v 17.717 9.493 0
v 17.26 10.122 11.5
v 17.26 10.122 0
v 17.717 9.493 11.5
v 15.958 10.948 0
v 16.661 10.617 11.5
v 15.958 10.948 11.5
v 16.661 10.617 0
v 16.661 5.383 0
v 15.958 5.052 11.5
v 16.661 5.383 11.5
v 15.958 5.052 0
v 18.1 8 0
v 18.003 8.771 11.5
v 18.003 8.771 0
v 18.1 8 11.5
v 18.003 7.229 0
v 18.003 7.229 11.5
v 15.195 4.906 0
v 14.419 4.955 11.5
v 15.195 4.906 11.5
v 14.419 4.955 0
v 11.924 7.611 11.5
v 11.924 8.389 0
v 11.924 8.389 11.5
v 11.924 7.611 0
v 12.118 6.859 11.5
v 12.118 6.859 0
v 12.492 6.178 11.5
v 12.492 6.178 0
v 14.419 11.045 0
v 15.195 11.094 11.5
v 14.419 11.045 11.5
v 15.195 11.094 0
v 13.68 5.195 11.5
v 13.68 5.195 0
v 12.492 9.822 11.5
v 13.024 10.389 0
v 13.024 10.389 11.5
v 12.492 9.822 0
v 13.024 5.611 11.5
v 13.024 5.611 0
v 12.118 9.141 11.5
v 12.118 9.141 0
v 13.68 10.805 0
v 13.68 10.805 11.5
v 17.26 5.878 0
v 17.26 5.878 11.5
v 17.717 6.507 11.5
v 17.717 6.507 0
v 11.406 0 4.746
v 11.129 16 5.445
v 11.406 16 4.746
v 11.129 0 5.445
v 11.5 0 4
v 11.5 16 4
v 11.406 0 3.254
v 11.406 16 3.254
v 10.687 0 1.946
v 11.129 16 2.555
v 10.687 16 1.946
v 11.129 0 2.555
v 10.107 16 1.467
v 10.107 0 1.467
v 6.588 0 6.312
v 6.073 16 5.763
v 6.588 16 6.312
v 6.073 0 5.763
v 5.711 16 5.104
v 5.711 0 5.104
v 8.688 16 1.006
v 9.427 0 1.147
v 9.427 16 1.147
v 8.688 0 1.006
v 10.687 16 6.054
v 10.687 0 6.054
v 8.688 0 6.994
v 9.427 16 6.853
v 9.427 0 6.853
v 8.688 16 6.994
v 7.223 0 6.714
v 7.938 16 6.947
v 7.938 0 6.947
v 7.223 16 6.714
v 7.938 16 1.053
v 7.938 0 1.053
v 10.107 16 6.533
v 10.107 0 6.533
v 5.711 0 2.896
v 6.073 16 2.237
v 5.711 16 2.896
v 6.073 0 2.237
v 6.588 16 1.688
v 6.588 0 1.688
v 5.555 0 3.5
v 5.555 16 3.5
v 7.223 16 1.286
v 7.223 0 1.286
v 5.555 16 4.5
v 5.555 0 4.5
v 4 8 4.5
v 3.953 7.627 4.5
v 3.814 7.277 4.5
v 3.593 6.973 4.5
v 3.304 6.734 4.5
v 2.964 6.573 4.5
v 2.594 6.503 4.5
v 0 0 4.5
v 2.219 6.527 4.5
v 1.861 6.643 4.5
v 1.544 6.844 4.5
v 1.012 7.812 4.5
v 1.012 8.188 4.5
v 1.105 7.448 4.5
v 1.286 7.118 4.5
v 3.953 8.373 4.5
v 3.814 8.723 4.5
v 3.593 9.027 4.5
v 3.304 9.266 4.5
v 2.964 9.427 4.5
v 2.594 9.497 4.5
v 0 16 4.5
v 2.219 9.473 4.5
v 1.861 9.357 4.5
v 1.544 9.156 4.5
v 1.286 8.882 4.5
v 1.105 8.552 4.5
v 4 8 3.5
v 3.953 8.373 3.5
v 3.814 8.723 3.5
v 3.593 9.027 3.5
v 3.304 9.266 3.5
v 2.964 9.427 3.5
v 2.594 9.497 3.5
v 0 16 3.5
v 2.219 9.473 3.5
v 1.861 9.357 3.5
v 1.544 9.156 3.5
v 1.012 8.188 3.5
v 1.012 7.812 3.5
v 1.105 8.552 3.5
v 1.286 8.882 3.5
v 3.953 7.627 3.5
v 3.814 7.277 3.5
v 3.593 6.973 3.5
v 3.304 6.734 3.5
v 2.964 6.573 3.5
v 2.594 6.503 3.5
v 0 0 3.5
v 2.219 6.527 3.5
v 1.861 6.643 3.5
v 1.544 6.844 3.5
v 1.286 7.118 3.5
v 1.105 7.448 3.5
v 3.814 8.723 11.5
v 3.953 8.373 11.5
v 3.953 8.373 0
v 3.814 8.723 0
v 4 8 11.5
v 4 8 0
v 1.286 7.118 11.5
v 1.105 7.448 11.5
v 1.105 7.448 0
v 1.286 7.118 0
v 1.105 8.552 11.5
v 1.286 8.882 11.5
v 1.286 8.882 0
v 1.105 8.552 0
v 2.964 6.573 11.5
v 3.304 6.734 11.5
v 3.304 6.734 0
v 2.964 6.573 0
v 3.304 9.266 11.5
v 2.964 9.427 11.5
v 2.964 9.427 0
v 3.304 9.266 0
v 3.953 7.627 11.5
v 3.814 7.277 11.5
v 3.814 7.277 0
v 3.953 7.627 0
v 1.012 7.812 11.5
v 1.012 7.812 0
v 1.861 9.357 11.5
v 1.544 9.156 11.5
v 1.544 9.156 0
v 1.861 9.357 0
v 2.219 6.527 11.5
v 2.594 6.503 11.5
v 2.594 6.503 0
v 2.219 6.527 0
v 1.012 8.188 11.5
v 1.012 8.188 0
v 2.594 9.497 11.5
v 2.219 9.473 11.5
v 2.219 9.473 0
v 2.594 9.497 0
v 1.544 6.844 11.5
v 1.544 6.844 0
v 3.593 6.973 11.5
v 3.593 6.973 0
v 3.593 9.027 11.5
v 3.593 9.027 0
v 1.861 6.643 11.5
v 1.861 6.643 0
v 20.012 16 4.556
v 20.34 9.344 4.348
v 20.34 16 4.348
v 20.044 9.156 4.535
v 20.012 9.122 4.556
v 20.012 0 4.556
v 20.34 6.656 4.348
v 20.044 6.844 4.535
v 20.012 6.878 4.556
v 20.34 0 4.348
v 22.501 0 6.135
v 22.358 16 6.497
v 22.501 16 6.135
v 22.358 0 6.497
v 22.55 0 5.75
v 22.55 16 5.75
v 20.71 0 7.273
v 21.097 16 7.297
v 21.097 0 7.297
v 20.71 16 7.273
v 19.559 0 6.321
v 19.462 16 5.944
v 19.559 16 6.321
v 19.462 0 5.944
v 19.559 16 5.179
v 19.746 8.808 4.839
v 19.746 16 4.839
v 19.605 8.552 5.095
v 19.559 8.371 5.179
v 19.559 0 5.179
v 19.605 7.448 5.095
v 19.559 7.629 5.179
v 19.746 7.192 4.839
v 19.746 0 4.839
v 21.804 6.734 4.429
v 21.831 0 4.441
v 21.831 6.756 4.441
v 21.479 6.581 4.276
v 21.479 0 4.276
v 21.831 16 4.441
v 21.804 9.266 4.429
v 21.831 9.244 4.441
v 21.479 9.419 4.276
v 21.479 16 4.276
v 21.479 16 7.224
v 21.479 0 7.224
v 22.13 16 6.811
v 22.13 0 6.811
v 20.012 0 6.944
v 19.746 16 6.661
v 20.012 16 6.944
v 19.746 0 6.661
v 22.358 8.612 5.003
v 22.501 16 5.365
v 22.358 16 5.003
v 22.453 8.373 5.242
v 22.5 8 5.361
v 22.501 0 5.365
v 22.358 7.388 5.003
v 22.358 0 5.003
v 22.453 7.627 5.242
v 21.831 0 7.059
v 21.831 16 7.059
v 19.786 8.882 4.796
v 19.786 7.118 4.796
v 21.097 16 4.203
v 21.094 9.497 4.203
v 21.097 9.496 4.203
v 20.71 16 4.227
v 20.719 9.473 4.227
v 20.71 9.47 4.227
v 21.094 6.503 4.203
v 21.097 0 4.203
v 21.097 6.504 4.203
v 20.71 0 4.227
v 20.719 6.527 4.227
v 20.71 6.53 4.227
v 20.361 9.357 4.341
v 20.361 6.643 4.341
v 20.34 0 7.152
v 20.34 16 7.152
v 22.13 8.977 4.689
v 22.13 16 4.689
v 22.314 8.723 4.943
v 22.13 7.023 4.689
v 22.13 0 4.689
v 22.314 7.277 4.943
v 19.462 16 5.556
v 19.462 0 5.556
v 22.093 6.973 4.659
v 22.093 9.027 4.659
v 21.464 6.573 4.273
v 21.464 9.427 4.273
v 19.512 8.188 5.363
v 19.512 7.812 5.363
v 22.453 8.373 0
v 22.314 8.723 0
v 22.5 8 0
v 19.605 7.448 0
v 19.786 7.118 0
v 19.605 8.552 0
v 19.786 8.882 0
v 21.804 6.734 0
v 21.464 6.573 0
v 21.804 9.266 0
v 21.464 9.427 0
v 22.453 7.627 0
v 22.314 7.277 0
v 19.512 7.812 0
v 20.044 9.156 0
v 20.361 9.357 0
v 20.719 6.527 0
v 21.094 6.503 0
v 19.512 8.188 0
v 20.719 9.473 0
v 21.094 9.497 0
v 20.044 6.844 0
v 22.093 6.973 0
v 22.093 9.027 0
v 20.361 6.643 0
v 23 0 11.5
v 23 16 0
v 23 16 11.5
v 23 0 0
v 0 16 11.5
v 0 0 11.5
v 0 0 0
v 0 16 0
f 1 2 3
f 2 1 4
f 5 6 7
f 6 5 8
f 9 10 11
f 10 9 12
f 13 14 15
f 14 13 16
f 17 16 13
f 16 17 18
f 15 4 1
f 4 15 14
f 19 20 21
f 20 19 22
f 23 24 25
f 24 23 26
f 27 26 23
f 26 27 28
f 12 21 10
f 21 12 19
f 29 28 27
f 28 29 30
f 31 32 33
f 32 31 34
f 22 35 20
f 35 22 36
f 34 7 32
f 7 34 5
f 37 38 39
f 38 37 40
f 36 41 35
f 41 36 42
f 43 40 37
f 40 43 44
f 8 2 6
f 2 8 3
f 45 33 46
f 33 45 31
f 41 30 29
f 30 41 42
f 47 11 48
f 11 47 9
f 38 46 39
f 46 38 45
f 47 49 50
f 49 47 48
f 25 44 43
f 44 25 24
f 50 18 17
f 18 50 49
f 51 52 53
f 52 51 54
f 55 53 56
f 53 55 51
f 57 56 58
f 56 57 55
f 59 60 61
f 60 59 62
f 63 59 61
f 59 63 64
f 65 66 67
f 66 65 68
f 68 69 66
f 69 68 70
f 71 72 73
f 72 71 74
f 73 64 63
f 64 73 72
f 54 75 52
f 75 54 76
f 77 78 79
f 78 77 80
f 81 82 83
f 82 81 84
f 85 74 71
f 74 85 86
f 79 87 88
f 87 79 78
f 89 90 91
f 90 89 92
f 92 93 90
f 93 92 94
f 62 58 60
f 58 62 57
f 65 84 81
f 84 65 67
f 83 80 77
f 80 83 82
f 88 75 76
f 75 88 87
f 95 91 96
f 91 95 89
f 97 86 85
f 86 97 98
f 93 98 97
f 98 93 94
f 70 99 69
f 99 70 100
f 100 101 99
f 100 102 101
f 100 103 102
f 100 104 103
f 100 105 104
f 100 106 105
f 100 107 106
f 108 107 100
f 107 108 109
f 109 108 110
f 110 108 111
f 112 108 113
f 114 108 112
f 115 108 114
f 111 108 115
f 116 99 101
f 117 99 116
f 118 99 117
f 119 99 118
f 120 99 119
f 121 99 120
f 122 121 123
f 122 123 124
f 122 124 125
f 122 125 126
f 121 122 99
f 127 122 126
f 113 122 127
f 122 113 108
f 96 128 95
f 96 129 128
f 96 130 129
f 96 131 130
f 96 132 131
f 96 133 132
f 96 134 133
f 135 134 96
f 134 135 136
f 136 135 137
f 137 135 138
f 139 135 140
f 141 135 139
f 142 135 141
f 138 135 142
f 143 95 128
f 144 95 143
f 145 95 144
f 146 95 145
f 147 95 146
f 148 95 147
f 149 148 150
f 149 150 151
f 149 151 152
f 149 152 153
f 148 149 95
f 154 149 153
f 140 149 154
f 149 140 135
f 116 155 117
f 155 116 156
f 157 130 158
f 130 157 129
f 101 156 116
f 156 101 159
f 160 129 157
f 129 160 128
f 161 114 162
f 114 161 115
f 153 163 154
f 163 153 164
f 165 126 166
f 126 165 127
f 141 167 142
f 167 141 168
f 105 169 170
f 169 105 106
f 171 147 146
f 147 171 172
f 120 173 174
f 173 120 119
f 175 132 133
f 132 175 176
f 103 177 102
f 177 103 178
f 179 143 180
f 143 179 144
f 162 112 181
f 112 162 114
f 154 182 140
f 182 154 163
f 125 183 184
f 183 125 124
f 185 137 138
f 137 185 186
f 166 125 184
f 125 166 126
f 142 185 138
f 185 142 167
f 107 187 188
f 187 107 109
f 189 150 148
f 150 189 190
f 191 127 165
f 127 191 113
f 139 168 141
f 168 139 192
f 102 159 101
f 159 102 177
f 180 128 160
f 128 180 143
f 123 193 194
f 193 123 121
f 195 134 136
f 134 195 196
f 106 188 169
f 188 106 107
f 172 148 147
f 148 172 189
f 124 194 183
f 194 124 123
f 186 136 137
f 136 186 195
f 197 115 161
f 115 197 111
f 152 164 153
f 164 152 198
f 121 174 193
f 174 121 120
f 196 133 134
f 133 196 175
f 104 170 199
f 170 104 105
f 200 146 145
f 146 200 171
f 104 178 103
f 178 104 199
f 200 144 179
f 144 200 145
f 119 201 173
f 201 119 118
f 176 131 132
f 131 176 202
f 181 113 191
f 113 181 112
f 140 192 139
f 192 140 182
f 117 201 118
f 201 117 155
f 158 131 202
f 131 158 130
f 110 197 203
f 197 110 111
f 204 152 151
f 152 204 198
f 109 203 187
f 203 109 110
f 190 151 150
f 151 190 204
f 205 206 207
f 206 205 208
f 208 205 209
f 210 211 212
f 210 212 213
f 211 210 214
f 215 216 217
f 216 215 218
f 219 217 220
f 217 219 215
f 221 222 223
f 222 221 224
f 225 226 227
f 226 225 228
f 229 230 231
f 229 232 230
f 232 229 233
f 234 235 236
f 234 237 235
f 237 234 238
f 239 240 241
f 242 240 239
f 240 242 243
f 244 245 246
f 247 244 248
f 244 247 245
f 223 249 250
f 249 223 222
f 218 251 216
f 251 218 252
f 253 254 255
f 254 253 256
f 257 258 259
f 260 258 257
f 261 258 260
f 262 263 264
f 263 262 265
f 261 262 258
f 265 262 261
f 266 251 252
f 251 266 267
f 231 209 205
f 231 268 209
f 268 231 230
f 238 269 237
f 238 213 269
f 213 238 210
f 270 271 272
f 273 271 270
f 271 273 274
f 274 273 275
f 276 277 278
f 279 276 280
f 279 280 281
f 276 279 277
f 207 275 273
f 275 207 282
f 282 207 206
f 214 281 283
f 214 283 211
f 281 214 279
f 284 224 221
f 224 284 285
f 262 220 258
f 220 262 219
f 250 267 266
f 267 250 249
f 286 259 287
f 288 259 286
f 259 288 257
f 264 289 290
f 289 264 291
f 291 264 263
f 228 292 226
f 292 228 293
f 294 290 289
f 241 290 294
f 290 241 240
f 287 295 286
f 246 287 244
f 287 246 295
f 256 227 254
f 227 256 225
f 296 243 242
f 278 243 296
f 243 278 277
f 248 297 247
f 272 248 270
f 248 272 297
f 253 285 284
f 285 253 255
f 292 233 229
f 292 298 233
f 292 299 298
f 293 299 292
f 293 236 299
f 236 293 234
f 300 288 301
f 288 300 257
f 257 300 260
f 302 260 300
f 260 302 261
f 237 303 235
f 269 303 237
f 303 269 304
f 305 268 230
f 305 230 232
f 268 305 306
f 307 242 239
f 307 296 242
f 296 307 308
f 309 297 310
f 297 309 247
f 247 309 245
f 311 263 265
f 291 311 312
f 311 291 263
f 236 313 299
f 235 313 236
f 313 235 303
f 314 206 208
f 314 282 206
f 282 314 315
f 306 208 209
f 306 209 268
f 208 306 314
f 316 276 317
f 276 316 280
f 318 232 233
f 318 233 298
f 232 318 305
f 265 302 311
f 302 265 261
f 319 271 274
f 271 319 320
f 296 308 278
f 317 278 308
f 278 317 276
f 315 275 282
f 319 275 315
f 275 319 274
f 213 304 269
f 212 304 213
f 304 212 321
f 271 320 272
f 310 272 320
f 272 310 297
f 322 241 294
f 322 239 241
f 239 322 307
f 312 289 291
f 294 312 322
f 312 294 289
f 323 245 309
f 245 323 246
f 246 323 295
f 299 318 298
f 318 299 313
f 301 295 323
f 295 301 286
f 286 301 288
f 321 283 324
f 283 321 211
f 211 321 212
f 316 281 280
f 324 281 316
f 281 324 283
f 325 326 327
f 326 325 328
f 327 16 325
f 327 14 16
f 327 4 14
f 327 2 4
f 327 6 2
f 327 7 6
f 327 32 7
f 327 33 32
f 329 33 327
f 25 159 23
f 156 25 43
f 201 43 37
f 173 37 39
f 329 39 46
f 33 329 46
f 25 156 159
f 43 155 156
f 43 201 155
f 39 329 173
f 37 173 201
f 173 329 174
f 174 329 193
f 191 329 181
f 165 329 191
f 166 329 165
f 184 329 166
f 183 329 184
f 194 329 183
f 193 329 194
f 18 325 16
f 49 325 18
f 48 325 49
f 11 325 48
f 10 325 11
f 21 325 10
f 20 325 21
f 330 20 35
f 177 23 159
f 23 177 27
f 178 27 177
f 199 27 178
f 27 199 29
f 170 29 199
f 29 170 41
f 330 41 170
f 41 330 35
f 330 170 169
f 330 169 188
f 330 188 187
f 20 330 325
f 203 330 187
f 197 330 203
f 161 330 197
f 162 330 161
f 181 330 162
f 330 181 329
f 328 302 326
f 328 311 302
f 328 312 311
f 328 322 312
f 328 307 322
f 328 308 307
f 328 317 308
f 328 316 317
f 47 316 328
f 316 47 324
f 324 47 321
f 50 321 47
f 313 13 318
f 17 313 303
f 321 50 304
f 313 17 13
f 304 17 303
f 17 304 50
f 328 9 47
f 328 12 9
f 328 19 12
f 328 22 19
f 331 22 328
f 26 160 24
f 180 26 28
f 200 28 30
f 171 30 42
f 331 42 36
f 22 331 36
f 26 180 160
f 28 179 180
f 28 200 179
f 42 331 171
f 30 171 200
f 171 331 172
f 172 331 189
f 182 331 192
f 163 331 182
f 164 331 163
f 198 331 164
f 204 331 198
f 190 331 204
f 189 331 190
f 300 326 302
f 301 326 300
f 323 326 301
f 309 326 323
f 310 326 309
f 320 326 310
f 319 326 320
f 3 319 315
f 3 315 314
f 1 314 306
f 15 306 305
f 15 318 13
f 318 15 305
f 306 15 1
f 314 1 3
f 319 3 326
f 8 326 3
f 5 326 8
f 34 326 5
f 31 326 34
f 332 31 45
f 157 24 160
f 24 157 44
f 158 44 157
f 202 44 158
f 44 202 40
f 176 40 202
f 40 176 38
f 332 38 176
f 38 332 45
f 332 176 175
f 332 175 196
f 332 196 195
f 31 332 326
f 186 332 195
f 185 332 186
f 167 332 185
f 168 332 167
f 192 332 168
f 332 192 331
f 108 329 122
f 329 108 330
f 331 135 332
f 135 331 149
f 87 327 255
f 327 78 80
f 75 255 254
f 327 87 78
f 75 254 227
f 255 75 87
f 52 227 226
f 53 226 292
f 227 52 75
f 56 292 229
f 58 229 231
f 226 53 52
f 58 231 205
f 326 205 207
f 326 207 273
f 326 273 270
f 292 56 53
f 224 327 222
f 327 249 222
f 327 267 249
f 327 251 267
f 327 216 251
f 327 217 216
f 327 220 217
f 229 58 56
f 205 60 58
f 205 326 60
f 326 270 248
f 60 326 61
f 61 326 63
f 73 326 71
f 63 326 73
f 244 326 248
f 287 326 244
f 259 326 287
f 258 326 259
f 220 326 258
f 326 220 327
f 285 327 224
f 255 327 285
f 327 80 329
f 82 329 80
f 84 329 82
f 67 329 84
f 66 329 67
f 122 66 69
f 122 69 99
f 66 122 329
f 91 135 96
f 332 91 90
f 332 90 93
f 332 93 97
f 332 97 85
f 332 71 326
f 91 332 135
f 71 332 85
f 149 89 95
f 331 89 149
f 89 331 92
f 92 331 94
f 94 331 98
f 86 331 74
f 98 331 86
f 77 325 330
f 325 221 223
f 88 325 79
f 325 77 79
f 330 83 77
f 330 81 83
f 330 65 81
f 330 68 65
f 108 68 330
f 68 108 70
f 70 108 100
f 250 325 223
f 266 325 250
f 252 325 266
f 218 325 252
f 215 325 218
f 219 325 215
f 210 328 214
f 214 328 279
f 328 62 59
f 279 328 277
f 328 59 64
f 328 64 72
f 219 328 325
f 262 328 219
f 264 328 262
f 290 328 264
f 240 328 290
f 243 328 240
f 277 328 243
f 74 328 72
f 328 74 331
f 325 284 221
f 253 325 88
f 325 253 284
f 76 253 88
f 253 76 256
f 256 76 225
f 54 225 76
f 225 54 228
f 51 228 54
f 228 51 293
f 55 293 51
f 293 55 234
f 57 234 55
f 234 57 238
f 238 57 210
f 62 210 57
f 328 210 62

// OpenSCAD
// Copyright 2017 Pavel Penev
// https://www.thingiverse.com/pavpen/about
//
// You can use this file under Attribution-ShareAlike 4.0 International
// (CC BY-SA 4.0).
//
// If you need to use it under another license, send me a message.

outer_dimensions = [23, 16, 11.5];
nozzle_hole_r = 6.2 / 2;
nozzle_hole_center = [outer_dimensions[0] - 8, 8];
heater_hole_r = 6 / 2;
heater_hole_center = [8.5, 4];
heater_bracket_gap_h = 1;
heater_bracket_gap_center_z = heater_hole_center[1];
heater_screw_hole_r = 3 / 2;
heater_screw_hole_center = [2.5, 8];
thermistor_hole_r = 3.1 / 2;
thermistor_hole_center = [outer_dimensions[0] - 2, 5.75];
thermistor_grub_screw_hole_r = 3 / 2;
thermistor_grub_screw_hole_center = [
    outer_dimensions[0] - 2,
    8
];

$fn = 25;

// Export functions:
function pro_pavpen_e3d_v6_heater_block_outer_dimensions() = outer_dimensions;


// Demo:
pro_pavpen_e3d_v6_heater_block();


module pro_pavpen_e3d_v6_heater_block()
{
    difference()
    {
        cube(outer_dimensions);
        
        pro_pavpen_e3d_v6_heater_block_holes();
    }
}

module pro_pavpen_e3d_v6_heater_block_holes(
    top_extra_h = 1,
    bottom_extra_h = 1,
    front_extra_h = 1,
    back_extra_h = 1,
    left_extra_h = 1
)
{
    union()
    {
        // Nozzle hole:
        translate([0, 0, -bottom_extra_h])
        pro_pavpen_e3d_v6_heater_block_position_as_nozzle_hole()
        cylinder(
            r = nozzle_hole_r,
            h = outer_dimensions[2] + bottom_extra_h + top_extra_h);
        
        // Heater hole:
        translate([0, outer_dimensions[1] + back_extra_h, 0])
        pro_pavpen_e3d_v6_heater_block_position_as_heater_hole()
        rotate([90, 0, 0])
        cylinder(
            r = heater_hole_r,
            h = outer_dimensions[1] + back_extra_h + front_extra_h);
        
        // Heater bracket gap:
        translate([
            -left_extra_h,
            -front_extra_h,
            heater_bracket_gap_center_z - heater_bracket_gap_h / 2])
        cube([
            heater_hole_center[0] + left_extra_h,
            outer_dimensions[1] + back_extra_h + front_extra_h,
            heater_bracket_gap_h]);
        
        // Heater screw hole:
        translate([0, 0, -bottom_extra_h])
        pro_pavpen_e3d_v6_heater_block_position_as_heater_screw_hole()
        cylinder(
            r = heater_screw_hole_r,
            h = outer_dimensions[2] + bottom_extra_h + top_extra_h);
        
        // Thermistor hole:
        translate([
            0,
            outer_dimensions[1] + back_extra_h,
            0])
        pro_pavpen_e3d_v6_heater_block_position_as_thermistor_hole()
        rotate([90, 0, 0])
        cylinder(
            r = thermistor_hole_r,
            h = outer_dimensions[1] + back_extra_h + front_extra_h);
        
        // Thermistor grub screw hole:
        translate([0, 0, -bottom_extra_h])
        pro_pavpen_e3d_v6_heater_block_position_as_thermistor_grub_screw_hole()
        cylinder(
            r = thermistor_grub_screw_hole_r,
            h = thermistor_hole_center[1] + bottom_extra_h);
    }
}

module pro_pavpen_e3d_v6_heater_block_position_as_nozzle_hole()
{
    translate([
        nozzle_hole_center[0],
        nozzle_hole_center[1],
        0])
    children();
}

module pro_pavpen_e3d_v6_heater_block_position_as_heater_hole()
{
    translate([
        heater_hole_center[0],
        0,
        heater_hole_center[1]])
    children();
}

module pro_pavpen_e3d_v6_heater_block_position_as_heater_screw_hole()
{
    translate([
        heater_screw_hole_center[0],
        heater_screw_hole_center[1],
        0])
    children();
}

module pro_pavpen_e3d_v6_heater_block_position_as_thermistor_hole()
{
    translate([
        thermistor_hole_center[0],
        0,
        thermistor_hole_center[1]])
    children();
}

module pro_pavpen_e3d_v6_heater_block_position_as_thermistor_grub_screw_hole()
{
    translate([
        thermistor_grub_screw_hole_center[0],
        thermistor_grub_screw_hole_center[1],
        0])
    children();
}
